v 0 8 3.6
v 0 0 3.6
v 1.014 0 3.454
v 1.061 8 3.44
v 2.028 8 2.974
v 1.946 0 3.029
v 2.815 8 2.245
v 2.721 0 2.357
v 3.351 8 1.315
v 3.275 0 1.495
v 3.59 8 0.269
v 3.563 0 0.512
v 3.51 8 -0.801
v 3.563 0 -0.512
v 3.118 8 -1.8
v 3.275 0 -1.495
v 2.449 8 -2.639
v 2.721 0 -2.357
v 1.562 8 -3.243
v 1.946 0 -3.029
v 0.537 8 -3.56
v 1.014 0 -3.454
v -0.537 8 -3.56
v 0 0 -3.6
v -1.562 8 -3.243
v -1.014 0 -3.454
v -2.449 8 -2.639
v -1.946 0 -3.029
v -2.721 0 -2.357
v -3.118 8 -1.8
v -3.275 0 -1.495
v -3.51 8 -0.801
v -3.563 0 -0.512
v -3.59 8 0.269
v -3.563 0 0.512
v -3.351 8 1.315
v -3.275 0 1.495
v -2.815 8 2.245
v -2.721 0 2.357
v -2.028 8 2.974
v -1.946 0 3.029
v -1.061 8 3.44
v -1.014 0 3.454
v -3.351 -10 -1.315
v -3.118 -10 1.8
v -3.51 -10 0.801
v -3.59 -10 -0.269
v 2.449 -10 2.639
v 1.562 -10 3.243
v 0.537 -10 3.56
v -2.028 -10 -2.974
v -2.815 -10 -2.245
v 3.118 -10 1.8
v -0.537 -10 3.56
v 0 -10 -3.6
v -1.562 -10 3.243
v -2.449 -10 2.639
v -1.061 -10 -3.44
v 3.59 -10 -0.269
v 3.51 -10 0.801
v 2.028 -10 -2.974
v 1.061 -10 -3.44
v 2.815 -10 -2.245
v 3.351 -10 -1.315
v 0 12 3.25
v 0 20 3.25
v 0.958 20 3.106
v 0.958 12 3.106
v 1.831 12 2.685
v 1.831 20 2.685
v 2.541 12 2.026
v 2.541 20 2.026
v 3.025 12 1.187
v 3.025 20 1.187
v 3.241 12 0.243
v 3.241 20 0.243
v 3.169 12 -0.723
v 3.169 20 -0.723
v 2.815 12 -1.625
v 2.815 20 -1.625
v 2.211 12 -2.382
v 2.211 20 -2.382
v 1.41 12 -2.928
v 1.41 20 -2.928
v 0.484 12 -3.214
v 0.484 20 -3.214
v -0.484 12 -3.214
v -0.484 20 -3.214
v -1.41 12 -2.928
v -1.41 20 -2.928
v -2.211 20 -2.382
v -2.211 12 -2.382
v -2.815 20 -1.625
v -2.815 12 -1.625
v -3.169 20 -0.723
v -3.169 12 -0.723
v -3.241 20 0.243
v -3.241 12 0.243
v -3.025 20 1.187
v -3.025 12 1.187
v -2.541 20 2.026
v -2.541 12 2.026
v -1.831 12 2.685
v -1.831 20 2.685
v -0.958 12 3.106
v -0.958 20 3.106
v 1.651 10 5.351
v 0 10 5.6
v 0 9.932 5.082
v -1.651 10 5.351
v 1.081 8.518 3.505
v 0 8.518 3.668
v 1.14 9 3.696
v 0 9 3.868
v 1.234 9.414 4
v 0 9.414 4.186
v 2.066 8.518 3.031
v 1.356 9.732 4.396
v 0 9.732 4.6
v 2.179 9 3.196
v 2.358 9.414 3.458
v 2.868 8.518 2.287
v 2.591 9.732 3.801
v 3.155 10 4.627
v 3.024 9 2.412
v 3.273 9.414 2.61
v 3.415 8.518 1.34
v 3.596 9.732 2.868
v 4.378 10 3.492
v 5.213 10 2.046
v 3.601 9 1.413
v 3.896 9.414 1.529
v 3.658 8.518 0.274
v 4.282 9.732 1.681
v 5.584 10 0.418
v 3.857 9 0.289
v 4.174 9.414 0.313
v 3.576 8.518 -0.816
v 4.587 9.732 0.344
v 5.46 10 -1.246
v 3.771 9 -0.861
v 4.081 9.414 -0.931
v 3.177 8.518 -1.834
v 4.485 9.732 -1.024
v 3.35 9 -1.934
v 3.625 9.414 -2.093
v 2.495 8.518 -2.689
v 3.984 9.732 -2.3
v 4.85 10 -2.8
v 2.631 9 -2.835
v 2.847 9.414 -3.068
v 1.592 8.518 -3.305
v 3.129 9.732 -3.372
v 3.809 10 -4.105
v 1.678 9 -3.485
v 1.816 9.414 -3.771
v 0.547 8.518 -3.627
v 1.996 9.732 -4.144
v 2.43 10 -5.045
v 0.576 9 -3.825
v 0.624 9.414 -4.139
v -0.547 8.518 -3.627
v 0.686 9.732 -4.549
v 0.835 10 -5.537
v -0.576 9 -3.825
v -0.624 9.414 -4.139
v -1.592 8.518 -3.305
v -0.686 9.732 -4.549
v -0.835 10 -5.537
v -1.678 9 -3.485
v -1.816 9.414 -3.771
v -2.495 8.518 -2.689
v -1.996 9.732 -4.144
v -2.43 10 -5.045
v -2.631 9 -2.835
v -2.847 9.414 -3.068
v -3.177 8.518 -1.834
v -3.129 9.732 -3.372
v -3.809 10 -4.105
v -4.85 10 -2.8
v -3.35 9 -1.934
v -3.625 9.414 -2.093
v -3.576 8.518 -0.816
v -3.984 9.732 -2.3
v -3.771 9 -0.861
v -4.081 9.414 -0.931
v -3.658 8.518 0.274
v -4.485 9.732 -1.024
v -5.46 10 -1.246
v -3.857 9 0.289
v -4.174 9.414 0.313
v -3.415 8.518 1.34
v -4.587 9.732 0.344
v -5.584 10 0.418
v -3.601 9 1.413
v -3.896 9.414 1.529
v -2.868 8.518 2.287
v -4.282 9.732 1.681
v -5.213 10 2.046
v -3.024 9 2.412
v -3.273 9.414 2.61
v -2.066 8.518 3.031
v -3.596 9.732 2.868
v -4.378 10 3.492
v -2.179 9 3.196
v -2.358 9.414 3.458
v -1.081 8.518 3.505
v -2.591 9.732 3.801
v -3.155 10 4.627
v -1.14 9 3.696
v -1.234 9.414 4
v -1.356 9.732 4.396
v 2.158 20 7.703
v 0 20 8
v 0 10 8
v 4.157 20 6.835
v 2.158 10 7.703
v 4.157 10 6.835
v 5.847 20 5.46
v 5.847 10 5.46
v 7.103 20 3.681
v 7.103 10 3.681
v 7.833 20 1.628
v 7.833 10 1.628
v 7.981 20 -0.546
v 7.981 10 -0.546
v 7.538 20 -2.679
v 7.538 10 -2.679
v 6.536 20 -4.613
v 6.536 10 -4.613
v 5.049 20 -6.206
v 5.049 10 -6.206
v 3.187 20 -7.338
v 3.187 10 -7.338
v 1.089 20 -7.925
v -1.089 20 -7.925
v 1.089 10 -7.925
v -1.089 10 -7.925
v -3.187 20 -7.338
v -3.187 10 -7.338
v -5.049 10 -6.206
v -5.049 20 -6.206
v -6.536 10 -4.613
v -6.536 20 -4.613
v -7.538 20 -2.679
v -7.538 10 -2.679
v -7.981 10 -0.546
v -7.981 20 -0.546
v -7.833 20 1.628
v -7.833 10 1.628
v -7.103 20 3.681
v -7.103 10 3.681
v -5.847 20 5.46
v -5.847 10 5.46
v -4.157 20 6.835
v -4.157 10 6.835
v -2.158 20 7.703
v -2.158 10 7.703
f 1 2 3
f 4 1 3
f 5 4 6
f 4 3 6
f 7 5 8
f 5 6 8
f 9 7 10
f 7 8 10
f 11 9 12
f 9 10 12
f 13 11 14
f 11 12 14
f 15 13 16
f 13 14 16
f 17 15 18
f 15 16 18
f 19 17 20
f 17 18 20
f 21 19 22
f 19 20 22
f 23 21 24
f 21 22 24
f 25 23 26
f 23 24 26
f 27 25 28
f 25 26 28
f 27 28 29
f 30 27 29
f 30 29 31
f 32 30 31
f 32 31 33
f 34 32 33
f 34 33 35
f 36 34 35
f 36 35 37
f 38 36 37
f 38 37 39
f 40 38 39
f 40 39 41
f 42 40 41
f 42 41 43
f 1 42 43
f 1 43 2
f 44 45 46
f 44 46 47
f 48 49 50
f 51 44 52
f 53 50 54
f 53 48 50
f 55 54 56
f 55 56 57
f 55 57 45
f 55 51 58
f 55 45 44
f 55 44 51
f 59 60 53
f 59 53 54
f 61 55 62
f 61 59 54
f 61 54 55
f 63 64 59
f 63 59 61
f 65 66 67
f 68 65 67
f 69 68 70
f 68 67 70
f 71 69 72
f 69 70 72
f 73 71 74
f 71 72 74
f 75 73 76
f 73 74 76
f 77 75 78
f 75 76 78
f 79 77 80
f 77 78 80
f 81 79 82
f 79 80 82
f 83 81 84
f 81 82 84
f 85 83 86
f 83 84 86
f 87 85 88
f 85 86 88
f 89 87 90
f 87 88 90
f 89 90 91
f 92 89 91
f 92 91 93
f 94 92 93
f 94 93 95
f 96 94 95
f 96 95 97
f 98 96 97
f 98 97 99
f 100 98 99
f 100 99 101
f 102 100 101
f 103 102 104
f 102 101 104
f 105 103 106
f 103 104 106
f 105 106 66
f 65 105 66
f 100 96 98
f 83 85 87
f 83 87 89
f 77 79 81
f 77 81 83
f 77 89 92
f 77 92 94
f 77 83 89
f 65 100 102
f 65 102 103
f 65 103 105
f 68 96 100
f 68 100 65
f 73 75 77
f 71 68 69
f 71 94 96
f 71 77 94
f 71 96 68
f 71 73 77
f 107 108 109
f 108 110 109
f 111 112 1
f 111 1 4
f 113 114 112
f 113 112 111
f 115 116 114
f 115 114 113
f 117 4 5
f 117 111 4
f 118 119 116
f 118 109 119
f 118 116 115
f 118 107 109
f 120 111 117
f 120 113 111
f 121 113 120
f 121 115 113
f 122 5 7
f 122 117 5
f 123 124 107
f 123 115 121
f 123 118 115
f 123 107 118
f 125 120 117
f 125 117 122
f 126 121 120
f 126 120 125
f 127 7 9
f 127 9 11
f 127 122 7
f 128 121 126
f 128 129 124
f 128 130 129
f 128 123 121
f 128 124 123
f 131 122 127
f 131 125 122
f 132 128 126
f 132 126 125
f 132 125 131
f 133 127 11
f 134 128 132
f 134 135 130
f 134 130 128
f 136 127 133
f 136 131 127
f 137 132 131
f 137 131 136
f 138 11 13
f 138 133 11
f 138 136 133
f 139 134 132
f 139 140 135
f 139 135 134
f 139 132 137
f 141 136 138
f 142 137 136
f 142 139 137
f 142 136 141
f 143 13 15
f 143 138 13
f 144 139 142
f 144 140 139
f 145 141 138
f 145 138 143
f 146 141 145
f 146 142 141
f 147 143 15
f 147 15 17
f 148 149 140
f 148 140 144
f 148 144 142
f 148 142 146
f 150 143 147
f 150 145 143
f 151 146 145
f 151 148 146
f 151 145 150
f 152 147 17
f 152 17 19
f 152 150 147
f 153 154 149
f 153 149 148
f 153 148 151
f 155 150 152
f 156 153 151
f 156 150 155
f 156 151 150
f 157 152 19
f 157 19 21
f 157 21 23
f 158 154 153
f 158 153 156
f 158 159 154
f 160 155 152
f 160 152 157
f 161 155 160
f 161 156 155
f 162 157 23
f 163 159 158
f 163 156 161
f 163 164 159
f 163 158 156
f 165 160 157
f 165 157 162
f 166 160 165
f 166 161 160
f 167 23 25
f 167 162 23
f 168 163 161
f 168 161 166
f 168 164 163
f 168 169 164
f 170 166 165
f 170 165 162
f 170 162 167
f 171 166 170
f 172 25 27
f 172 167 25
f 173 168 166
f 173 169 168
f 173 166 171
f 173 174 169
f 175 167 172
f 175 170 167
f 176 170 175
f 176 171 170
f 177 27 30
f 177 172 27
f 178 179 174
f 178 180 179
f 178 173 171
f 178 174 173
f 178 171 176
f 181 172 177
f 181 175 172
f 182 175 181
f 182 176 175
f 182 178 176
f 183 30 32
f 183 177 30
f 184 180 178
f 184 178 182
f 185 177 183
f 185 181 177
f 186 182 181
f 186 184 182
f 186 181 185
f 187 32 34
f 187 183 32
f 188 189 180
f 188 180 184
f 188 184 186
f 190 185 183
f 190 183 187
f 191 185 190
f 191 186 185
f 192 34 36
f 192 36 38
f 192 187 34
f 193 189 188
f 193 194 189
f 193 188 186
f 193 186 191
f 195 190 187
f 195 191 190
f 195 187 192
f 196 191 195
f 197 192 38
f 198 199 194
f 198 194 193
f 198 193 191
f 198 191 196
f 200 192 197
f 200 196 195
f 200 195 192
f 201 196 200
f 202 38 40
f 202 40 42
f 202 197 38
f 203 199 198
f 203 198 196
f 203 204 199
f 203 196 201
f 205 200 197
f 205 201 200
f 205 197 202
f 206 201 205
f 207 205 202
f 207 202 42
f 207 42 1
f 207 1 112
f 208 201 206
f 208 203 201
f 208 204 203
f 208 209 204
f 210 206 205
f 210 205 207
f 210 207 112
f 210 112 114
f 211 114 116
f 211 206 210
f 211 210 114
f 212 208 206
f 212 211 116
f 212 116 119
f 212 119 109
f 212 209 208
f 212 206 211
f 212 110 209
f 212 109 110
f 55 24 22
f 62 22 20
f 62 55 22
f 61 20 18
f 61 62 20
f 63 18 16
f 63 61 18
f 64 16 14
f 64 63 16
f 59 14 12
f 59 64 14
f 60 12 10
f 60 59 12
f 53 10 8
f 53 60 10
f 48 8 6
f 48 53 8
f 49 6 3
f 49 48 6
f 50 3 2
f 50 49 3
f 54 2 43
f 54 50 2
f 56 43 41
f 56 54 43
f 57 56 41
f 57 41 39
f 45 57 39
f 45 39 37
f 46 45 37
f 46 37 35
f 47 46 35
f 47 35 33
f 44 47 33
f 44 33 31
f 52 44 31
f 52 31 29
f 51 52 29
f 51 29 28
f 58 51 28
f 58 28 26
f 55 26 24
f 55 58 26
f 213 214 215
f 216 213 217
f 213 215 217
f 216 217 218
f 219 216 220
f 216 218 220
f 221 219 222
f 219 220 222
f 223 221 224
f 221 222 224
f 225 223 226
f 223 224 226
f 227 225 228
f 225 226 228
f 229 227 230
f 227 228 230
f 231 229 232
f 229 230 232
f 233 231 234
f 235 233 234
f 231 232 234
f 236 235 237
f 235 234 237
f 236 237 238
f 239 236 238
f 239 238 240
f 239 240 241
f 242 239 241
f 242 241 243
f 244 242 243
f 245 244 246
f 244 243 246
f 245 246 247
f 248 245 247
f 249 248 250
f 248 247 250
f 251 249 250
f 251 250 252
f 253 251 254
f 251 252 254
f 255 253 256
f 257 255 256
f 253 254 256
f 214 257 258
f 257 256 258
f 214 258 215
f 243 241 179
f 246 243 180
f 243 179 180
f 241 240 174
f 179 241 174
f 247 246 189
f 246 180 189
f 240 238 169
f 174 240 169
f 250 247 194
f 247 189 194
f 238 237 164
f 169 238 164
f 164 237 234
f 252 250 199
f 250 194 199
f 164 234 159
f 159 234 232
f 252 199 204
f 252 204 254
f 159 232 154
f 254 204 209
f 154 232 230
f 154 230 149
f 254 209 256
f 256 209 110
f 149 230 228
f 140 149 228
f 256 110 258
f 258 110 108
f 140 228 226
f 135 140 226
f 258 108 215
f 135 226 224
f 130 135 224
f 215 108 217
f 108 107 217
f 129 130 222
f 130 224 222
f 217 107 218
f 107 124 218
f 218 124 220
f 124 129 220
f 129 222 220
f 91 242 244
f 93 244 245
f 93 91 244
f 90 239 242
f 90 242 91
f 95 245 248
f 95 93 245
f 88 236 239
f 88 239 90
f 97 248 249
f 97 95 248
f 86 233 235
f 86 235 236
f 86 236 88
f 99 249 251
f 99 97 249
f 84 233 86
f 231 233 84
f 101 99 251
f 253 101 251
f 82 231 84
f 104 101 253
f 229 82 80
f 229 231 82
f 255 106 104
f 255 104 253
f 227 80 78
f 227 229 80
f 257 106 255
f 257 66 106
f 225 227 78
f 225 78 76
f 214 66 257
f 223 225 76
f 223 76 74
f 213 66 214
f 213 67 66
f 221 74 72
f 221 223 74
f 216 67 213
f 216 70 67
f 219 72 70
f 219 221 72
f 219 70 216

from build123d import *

# Parameters (mm, degrees)
SKETCH1_R           = 3.6
BOSS_EXTRUDE1_DEPTH = 10
SKETCH2_R           = 8
BOSS_EXTRUDE2_DEPTH = 10
SKETCH3_R           = 3.25
CUT_EXTRUDE1_DEPTH  = 8
BOSS_EXTRUDE3_START = 10
SKETCH4_R           = 3.6
BOSS_EXTRUDE3_DEPTH = 10
FILLET1_R           = 2


with BuildPart() as part:
    # Sketch1 → Boss-Extrude1 (new body)
    with BuildSketch(Plane(origin=(0, 0, 0), x_dir=(1, 0, 0), z_dir=(0, 1, 0))):
        with Locations(Location((0, 0, 0), (0, 0, 270))):
            Circle(SKETCH1_R)
    extrude(amount=BOSS_EXTRUDE1_DEPTH)

    # Sketch2 → Boss-Extrude2 (add)
    with BuildSketch(Plane(origin=(0, 10, 0), x_dir=(1, 0, 0), z_dir=(0, 1, 0))):
        with Locations(Location((0, 0, 0), (0, 0, 270))):
            Circle(SKETCH2_R)
    extrude(amount=BOSS_EXTRUDE2_DEPTH)

    # Sketch3 → Cut-Extrude1 (cut)
    with BuildSketch(Plane(origin=(0, 20, 0), x_dir=(1, 0, 0), z_dir=(0, 1, 0))):
        with Locations(Location((0, 0, 0), (0, 0, 270))):
            Circle(SKETCH3_R)
    extrude(amount=-CUT_EXTRUDE1_DEPTH, mode=Mode.SUBTRACT)

    # Sketch4 → Boss-Extrude3 (add)
    with BuildSketch(Plane.XZ.offset(BOSS_EXTRUDE3_START)):
        with Locations(Location((0, 0, 0), (0, 0, 270))):
            Circle(SKETCH4_R)
    extrude(amount=-BOSS_EXTRUDE3_DEPTH)

    # Fillet1
    fillet1_edges = [part.edges().sort_by_distance(p)[0] for p in [
        (0, 10, -3.6),
    ]]
    fillet(fillet1_edges, radius=FILLET1_R)


solid = part.part
